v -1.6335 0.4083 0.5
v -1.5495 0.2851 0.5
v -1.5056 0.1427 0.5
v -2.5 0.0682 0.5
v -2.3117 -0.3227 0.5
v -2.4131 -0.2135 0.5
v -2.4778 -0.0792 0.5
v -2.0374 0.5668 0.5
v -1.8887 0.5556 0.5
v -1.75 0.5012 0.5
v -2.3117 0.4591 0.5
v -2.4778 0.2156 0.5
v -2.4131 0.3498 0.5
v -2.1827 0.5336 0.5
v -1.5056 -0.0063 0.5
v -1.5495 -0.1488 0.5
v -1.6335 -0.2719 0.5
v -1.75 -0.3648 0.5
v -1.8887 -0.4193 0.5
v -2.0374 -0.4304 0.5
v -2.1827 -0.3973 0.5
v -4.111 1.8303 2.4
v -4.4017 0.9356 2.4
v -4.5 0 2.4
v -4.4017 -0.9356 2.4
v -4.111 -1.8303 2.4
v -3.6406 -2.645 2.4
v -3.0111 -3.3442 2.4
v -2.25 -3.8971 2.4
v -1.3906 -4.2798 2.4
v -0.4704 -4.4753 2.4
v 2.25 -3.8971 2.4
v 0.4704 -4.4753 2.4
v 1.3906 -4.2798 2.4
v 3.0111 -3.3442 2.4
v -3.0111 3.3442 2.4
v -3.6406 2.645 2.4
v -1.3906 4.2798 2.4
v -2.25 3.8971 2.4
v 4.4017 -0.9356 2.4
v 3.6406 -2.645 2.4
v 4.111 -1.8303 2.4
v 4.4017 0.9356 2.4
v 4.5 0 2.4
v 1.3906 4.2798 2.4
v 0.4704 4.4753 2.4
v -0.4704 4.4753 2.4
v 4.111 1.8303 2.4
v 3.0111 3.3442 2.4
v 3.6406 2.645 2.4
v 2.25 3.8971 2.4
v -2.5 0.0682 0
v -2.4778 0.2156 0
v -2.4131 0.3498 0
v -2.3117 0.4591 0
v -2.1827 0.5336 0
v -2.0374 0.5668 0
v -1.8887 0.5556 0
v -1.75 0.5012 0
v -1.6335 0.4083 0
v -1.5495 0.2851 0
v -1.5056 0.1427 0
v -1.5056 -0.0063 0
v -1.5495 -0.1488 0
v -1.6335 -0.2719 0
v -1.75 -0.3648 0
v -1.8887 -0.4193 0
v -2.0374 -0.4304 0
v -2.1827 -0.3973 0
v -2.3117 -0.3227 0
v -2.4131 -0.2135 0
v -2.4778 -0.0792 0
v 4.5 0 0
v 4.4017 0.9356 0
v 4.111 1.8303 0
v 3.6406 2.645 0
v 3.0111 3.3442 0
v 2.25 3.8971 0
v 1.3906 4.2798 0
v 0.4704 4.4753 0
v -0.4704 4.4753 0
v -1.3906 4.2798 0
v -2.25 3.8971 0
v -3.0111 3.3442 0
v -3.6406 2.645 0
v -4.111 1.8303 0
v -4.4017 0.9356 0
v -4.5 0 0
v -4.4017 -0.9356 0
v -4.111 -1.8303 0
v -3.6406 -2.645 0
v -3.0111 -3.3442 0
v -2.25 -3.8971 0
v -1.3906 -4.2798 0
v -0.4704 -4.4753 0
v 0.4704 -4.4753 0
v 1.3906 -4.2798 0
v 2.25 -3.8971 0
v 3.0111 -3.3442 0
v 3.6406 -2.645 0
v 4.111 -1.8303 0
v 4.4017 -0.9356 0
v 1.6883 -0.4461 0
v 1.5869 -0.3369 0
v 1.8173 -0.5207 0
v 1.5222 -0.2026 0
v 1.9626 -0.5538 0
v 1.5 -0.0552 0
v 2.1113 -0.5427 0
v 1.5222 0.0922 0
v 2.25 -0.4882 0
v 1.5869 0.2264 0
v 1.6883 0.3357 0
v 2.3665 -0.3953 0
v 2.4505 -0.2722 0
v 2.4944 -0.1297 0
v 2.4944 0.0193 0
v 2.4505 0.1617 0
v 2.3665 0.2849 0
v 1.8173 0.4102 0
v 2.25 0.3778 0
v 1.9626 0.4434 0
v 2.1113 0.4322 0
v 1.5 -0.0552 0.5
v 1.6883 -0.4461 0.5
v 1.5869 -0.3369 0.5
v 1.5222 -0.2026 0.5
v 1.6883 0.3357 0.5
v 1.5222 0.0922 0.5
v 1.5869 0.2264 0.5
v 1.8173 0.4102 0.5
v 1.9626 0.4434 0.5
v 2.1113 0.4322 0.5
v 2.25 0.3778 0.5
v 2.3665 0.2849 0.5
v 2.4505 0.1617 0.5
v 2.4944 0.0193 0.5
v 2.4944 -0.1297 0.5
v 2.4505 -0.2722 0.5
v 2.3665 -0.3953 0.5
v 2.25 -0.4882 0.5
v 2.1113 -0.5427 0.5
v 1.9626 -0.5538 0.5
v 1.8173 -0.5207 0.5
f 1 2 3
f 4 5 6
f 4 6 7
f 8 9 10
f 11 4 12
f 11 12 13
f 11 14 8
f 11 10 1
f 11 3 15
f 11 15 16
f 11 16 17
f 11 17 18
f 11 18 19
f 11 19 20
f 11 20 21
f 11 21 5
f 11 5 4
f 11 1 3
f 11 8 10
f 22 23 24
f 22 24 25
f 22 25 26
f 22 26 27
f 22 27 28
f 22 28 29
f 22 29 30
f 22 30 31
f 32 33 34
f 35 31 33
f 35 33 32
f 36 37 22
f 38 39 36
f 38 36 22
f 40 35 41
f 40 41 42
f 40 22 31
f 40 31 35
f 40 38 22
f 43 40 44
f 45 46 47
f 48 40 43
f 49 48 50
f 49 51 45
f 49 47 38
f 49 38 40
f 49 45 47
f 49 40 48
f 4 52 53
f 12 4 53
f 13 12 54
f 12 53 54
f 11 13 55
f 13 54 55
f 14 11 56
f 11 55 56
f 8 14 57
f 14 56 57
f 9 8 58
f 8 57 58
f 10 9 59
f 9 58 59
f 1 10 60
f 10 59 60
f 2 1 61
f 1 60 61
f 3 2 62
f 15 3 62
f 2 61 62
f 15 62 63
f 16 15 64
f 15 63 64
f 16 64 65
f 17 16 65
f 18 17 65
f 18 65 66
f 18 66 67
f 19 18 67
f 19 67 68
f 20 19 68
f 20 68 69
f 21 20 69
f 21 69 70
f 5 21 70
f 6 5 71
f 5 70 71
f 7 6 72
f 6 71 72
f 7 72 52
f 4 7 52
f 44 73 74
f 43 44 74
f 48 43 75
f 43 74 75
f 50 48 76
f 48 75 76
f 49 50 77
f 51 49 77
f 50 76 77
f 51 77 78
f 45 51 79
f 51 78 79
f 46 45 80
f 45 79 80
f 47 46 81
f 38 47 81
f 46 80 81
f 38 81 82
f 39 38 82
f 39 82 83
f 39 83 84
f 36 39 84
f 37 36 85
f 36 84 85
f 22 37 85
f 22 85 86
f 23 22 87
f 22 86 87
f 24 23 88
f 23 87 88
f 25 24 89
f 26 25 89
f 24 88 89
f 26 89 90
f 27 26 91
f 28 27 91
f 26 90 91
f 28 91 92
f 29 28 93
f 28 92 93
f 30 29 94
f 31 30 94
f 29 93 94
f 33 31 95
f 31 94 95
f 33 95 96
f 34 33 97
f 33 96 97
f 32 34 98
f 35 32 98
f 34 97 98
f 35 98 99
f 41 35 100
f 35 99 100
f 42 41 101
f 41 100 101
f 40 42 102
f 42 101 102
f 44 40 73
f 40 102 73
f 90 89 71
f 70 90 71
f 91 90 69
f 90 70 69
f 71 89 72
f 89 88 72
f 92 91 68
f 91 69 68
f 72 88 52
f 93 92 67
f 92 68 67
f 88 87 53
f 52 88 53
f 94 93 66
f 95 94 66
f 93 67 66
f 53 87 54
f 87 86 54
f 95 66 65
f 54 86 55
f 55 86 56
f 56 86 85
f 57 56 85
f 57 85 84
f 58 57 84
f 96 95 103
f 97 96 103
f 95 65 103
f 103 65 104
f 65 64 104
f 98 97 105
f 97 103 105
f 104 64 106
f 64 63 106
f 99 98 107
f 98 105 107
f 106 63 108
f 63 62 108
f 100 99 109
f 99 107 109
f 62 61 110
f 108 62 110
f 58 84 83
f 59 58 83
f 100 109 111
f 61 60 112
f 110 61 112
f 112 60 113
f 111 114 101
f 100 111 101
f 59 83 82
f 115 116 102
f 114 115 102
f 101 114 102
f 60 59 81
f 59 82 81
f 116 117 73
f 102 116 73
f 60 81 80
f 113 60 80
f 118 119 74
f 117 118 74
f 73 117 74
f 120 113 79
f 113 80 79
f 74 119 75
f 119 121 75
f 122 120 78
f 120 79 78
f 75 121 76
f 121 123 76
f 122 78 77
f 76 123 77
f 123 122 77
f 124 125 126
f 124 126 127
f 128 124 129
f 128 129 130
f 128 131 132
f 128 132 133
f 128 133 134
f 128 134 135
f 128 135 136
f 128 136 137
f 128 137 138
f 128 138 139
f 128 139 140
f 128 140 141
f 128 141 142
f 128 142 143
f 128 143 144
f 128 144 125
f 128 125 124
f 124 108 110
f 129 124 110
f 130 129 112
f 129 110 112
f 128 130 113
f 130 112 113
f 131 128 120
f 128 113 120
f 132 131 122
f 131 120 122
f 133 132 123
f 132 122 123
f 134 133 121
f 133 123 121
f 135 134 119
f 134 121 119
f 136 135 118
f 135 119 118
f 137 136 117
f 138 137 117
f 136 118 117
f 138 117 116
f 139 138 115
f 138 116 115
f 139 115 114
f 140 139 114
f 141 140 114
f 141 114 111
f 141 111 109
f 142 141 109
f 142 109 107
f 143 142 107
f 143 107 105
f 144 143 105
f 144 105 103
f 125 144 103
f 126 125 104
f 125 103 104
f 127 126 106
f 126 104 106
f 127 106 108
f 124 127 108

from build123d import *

# Parameters (mm, degrees)
SKETCH1_R           = 4.5
BOSS_EXTRUDE1_DEPTH = 2.4
SKETCH2_R           = 0.5
CUT_EXTRUDE1_DEPTH  = 0.5


with BuildPart() as part:
    # Sketch1 → Boss-Extrude1 (new body)
    with BuildSketch(Plane.XY):
        Circle(SKETCH1_R)
    extrude(amount=BOSS_EXTRUDE1_DEPTH)

    # Sketch2 → Cut-Extrude1 (cut)
    with BuildSketch(Plane(origin=(0, 0, 0), x_dir=(-1, 0, 0), z_dir=(0, 0, -1))):
        with Locations((2, 0.068183801)):
            Circle(SKETCH2_R)
        with Locations((-2, -0.055218249)):
            Circle(SKETCH2_R)
    extrude(amount=-CUT_EXTRUDE1_DEPTH, mode=Mode.SUBTRACT)


solid = part.part
